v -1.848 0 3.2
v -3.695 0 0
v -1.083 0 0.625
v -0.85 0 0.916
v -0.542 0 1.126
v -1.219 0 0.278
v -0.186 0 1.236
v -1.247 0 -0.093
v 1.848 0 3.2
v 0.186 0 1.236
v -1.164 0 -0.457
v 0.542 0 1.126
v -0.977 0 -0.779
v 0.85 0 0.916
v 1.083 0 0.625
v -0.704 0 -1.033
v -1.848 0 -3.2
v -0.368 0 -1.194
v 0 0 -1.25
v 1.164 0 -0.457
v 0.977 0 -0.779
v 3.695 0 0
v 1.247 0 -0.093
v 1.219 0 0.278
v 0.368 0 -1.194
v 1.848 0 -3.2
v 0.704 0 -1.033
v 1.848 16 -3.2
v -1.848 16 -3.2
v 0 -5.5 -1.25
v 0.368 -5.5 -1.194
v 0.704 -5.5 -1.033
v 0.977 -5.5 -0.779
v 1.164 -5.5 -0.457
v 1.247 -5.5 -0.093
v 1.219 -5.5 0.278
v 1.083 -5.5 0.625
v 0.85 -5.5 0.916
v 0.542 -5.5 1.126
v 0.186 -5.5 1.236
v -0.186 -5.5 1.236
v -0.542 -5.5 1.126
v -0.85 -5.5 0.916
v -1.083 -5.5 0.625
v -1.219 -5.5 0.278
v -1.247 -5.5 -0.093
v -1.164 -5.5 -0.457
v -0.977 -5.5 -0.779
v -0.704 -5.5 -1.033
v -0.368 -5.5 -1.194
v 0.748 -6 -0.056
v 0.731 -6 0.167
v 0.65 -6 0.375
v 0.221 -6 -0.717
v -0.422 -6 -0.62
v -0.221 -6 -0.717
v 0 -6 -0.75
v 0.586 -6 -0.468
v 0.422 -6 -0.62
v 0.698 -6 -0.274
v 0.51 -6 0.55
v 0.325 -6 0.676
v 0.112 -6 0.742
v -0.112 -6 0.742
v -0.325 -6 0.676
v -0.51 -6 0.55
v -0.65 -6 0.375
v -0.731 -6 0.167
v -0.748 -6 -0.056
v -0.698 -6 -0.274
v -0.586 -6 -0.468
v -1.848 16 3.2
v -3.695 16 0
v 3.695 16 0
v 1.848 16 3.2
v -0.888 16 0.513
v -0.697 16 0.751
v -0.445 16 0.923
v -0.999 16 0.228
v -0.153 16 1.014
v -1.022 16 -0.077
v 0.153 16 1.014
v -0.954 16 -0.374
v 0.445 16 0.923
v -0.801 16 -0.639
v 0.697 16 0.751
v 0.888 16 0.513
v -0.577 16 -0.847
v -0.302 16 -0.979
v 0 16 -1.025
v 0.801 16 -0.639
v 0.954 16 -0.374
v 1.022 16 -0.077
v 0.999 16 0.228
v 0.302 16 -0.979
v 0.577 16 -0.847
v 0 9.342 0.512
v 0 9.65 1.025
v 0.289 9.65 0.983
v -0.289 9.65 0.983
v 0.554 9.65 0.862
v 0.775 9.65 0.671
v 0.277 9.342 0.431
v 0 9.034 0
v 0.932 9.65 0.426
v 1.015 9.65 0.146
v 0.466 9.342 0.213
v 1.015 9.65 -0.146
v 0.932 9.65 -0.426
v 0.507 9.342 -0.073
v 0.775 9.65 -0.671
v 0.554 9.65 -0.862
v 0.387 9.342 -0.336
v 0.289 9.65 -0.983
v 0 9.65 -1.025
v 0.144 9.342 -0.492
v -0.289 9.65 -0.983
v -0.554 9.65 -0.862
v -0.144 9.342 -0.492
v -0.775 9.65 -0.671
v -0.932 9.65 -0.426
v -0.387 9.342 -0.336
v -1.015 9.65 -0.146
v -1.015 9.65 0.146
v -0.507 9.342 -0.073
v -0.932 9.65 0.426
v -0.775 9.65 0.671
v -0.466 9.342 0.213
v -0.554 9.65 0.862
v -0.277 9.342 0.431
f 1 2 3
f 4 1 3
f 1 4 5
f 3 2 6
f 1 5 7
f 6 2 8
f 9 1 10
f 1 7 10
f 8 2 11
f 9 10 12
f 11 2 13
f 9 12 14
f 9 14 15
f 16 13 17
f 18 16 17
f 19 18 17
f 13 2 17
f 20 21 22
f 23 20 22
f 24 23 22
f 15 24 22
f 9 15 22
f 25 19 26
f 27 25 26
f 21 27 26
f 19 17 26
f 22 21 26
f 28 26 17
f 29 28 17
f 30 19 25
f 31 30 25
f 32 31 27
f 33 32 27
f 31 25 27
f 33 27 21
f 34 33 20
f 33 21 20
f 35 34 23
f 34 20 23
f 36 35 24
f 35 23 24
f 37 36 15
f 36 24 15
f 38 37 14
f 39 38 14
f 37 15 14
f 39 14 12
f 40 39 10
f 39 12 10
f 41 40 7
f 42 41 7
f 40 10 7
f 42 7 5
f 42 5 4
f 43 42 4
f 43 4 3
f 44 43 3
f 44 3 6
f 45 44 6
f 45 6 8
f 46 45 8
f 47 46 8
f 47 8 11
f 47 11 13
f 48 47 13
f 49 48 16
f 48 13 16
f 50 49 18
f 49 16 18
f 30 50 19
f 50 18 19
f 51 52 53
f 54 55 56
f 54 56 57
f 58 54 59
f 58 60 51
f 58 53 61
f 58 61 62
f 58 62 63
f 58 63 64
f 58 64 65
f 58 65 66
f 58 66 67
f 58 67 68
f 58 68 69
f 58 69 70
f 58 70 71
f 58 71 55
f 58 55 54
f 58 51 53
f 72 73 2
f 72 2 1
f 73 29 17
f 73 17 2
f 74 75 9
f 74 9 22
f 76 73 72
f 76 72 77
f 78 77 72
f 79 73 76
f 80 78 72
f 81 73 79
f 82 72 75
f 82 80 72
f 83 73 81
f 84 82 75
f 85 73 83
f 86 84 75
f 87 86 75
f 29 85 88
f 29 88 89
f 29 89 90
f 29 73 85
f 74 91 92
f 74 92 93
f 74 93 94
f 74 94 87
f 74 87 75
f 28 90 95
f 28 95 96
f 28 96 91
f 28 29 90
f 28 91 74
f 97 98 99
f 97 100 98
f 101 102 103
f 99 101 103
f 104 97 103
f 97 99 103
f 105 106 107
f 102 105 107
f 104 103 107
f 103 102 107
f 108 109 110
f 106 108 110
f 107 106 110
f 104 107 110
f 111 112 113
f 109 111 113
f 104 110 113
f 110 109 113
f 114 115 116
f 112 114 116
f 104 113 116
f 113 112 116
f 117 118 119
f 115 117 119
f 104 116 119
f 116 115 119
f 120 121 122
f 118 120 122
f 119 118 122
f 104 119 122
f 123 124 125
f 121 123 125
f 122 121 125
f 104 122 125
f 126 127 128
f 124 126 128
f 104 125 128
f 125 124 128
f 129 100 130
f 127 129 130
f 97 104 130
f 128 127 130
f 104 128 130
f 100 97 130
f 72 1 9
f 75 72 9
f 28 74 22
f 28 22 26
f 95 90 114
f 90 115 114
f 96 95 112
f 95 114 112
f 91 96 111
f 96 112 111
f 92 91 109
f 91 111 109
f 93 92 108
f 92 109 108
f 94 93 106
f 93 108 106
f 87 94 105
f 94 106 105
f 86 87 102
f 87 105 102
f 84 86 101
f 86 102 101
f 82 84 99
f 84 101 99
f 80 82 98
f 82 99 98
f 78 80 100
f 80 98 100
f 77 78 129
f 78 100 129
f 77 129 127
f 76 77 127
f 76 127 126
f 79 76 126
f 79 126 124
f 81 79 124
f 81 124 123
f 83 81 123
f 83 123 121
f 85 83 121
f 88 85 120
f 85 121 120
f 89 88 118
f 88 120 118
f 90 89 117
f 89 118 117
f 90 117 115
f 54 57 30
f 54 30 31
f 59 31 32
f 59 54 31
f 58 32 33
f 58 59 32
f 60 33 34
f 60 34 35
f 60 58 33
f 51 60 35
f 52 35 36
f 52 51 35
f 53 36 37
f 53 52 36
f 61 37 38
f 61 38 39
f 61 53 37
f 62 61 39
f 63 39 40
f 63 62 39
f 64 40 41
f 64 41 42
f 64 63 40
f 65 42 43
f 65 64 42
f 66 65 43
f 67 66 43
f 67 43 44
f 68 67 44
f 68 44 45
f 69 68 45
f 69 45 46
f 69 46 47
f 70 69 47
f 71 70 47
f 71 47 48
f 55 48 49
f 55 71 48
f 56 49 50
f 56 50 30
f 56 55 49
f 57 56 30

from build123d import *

# Parameters (mm, degrees)
BOSS_EXTRUDE1_DEPTH     = 16
M2_5_TAPPED_HOLE1_D     = 2.05
M2_5_TAPPED_HOLE1_DEPTH = 6.35
M2_5_TAPPED_HOLE1_TIP   = 0.615882135
SKETCH3_R               = 1.25
BOSS_EXTRUDE2_DEPTH     = 6
CHAMFER1_SIZE           = 0.5


with BuildPart() as part:
    # Sketch1 → Boss-Extrude1 (new body)
    with BuildSketch(Plane(origin=(0, 0, 0), x_dir=(1, 0, 0), z_dir=(0, 1, 0))):
        Polygon((3.695041723, 0), (1.847520861, 3.2), (-1.847520861, 3.2), (-3.695041723, 0), (-1.847520861, -3.2), (1.847520861, -3.2), align=None)
    extrude(amount=BOSS_EXTRUDE1_DEPTH)

    # M2.5 Tapped Hole1
    with Locations(Plane.ZX.offset(16)):
        with Locations((0, 0)):
            Hole(M2_5_TAPPED_HOLE1_D / 2, depth=M2_5_TAPPED_HOLE1_DEPTH)
            with Locations((0, 0, -(M2_5_TAPPED_HOLE1_DEPTH + M2_5_TAPPED_HOLE1_TIP / 2))):  # 118° drill point
                Cone(0, M2_5_TAPPED_HOLE1_D / 2, M2_5_TAPPED_HOLE1_TIP, mode=Mode.SUBTRACT)

    # Sketch3 → Boss-Extrude2 (add)
    with BuildSketch(Plane.XZ):
        with Locations(Location((0, 0, 0), (0, 0, 270))):
            Circle(SKETCH3_R)
    extrude(amount=BOSS_EXTRUDE2_DEPTH)

    # Chamfer1
    chamfer1_edges = [part.edges().sort_by_distance(p)[0] for p in [
        (0, -6, 1.25),
    ]]
    chamfer(chamfer1_edges, length=CHAMFER1_SIZE)


solid = part.part
